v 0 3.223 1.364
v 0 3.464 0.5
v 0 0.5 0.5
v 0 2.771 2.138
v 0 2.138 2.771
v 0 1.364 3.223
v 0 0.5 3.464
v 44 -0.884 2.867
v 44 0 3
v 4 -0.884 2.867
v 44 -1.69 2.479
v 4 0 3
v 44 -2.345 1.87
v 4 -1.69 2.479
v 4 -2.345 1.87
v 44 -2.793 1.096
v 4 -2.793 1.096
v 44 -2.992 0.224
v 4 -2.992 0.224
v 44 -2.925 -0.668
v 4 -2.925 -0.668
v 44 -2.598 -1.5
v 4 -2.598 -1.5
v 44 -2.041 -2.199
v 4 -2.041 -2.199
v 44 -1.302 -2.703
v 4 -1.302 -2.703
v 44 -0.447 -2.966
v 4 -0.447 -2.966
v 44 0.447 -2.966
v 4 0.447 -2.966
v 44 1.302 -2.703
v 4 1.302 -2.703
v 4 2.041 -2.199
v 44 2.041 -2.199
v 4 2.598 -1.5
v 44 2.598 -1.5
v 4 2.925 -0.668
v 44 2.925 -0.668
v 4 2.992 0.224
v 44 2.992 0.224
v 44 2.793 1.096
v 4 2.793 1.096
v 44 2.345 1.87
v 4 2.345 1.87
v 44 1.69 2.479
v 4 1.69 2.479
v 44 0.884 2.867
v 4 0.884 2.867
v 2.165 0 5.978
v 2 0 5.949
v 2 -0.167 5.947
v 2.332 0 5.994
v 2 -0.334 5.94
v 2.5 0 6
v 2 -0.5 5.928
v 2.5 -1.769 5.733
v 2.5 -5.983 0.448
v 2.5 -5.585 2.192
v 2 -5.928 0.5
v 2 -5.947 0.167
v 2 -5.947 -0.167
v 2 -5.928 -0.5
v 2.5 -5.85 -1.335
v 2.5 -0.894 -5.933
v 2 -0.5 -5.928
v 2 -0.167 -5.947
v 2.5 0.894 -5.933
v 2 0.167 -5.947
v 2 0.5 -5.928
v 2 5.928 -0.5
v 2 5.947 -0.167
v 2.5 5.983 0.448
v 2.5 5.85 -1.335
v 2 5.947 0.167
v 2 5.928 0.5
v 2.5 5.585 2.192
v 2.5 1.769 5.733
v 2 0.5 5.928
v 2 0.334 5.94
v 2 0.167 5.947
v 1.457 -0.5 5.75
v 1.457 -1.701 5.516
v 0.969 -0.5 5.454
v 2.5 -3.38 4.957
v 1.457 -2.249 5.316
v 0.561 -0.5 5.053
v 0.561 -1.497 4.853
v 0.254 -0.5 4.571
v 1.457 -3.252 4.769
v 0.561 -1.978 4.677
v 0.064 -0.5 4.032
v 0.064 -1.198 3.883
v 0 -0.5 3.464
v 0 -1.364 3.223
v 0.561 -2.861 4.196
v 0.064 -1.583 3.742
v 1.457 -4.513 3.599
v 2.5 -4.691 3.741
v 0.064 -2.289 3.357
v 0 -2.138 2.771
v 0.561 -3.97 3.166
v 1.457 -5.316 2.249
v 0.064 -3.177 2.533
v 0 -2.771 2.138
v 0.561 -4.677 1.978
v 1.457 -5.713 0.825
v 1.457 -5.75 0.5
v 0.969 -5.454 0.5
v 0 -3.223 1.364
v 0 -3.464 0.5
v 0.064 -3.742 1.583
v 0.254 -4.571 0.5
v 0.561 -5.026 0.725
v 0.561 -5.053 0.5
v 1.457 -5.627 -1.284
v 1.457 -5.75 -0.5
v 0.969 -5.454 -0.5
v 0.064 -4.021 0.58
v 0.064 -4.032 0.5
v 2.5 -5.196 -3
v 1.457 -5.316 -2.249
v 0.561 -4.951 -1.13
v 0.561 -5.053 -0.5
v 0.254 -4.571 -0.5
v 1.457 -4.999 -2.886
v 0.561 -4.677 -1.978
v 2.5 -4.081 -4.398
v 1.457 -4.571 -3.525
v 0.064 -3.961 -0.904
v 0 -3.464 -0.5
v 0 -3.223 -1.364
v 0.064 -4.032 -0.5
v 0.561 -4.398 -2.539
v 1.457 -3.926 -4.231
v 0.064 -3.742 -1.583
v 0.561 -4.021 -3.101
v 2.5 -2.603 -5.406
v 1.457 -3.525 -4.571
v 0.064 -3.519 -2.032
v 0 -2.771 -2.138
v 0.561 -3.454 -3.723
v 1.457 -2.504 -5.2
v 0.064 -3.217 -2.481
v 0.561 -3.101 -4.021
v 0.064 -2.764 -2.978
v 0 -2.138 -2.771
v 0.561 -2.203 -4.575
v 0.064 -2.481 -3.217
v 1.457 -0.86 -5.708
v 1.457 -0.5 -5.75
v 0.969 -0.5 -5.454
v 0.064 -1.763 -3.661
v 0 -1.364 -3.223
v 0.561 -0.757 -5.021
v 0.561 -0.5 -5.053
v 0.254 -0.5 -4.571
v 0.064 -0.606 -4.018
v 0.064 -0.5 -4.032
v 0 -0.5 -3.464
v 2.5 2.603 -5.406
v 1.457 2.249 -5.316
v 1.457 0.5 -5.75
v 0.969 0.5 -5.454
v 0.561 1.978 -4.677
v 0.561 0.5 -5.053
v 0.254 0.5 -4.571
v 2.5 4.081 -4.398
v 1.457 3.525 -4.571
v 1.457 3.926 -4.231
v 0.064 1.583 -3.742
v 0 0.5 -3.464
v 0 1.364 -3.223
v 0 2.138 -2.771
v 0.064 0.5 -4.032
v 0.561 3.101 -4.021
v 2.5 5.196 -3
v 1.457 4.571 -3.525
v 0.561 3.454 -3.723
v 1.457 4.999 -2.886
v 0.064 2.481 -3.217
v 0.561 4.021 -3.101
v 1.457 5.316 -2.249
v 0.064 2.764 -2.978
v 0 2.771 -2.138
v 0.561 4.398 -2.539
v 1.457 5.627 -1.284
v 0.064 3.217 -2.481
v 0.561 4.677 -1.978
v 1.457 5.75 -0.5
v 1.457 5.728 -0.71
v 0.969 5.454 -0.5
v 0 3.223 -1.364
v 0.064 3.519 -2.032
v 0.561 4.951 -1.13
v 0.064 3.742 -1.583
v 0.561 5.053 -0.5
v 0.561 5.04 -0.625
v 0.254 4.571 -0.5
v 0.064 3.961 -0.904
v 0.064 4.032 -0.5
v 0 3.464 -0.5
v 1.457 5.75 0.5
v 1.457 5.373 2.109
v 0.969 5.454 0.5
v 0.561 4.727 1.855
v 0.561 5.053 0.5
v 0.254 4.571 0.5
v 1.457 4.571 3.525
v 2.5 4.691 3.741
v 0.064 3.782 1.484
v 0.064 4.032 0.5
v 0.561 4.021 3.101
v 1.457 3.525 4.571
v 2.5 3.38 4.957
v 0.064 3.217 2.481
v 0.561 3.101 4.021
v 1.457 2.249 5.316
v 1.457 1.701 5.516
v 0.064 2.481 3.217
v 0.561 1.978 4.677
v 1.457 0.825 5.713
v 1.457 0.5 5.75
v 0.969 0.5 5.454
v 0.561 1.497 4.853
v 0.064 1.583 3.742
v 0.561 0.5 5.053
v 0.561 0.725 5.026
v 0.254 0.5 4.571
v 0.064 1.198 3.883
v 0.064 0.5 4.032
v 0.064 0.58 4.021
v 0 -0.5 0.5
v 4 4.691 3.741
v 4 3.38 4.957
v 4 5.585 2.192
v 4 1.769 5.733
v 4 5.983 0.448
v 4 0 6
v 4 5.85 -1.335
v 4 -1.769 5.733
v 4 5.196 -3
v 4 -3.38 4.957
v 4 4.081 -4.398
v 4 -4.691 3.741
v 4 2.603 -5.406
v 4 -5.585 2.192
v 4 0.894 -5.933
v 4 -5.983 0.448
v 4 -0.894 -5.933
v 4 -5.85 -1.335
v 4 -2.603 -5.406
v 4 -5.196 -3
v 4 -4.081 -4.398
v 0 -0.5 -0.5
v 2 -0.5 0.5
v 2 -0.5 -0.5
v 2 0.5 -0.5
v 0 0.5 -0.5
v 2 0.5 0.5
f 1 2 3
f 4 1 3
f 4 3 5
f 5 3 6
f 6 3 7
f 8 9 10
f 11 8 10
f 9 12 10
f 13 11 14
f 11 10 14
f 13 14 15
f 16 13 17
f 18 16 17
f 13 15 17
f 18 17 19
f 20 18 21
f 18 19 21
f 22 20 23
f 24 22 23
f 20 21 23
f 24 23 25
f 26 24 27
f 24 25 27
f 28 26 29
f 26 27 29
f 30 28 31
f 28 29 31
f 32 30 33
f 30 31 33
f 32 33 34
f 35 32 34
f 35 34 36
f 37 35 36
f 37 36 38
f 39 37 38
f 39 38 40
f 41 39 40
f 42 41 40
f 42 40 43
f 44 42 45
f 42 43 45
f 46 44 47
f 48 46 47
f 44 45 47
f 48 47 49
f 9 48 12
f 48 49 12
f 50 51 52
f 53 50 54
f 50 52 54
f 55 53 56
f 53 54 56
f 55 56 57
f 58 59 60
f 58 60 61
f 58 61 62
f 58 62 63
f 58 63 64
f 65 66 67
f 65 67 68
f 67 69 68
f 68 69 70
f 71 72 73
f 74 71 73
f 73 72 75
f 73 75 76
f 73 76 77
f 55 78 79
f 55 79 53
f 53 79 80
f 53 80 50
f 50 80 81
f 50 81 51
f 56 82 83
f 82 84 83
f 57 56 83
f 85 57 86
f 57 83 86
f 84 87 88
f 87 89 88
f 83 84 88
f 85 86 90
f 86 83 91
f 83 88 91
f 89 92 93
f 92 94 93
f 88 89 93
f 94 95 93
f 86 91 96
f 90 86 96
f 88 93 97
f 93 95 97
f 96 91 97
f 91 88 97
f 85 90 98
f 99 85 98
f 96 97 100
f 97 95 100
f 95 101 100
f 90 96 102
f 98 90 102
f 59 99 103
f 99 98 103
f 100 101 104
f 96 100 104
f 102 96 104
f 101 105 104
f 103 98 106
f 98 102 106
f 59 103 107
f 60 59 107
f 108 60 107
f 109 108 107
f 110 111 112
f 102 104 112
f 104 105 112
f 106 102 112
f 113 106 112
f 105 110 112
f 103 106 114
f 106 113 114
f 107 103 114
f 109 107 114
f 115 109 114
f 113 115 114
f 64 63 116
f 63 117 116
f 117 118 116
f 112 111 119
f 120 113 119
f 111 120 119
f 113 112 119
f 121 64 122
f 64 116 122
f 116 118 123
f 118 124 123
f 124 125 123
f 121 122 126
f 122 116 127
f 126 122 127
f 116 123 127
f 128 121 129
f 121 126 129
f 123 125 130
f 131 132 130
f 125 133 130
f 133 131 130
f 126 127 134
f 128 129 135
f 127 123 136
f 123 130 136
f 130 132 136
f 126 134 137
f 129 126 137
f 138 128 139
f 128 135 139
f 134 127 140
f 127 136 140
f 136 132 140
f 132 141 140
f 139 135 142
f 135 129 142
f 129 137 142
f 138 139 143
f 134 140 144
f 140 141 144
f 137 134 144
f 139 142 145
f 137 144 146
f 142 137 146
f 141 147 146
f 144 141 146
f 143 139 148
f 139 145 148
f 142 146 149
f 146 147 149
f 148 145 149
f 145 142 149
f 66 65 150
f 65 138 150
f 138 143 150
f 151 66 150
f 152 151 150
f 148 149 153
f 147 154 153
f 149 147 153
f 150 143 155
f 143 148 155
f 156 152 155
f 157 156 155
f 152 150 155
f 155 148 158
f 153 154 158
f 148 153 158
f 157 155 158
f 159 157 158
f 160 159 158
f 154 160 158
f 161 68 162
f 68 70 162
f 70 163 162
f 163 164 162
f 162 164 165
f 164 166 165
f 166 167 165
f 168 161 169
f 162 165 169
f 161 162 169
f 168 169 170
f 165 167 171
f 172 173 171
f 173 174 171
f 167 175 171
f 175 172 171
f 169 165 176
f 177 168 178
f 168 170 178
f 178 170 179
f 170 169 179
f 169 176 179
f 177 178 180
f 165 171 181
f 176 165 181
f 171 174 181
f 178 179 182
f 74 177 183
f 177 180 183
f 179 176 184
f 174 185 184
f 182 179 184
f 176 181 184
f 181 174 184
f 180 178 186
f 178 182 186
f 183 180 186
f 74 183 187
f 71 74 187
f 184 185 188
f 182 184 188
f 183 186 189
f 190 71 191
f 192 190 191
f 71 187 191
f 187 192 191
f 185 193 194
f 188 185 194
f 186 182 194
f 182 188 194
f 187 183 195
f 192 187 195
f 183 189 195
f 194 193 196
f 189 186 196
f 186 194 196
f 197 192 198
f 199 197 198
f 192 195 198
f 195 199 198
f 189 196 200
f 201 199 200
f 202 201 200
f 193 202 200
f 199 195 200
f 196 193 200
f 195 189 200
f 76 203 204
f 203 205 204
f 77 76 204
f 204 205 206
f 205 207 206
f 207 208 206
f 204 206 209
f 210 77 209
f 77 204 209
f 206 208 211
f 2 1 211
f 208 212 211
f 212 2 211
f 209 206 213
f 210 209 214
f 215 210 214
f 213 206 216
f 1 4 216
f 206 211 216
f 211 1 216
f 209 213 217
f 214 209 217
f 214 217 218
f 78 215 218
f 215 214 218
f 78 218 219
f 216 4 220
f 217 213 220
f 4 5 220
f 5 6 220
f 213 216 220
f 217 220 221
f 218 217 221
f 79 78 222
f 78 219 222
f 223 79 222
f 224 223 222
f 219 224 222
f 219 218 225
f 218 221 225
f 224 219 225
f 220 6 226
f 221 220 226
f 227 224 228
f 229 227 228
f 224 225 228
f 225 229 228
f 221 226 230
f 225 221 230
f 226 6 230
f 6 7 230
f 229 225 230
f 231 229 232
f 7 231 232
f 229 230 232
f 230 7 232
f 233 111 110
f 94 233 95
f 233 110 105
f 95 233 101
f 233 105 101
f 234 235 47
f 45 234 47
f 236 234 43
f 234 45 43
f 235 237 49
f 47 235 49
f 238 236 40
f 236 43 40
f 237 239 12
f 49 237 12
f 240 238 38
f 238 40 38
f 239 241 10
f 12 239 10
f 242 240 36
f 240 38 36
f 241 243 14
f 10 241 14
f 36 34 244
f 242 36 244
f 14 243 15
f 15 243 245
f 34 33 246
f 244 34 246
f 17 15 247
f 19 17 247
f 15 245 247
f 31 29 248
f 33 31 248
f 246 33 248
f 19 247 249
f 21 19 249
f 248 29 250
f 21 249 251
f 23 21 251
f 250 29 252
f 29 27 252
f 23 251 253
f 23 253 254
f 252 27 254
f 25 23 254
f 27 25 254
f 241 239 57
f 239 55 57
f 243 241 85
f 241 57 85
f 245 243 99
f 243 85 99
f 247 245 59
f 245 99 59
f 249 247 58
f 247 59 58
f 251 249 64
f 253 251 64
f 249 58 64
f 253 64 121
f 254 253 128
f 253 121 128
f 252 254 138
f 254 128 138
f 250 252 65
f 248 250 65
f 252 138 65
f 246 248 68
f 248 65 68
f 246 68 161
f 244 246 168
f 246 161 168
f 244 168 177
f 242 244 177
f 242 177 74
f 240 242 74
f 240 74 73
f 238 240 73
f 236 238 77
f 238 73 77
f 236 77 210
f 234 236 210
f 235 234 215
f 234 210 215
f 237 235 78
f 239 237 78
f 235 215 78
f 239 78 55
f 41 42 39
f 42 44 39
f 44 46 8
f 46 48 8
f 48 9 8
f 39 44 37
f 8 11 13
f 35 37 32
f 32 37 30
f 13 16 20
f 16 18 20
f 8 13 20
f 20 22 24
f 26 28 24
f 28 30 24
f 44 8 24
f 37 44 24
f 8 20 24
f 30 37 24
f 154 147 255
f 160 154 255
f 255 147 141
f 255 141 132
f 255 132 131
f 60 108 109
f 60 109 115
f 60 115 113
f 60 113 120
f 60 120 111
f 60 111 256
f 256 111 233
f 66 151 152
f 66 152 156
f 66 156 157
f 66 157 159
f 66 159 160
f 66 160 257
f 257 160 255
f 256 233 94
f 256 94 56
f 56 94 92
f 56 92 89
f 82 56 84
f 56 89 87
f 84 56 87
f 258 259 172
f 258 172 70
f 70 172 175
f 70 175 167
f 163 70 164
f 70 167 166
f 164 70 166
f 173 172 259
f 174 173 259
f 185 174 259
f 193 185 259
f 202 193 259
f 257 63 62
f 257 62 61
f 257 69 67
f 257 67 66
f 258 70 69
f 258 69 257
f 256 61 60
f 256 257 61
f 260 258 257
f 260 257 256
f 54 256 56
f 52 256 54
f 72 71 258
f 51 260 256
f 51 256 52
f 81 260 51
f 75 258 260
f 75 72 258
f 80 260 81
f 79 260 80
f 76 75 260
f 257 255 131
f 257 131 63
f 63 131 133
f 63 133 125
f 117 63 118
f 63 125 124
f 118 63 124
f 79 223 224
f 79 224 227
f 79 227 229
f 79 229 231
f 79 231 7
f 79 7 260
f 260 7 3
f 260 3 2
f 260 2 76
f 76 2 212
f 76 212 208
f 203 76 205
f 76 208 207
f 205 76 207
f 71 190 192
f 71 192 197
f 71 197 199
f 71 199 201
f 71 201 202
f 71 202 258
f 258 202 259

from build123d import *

# Parameters (mm, degrees)
CUT_EXTRUDE_1_DEPTH = 2


with BuildPart() as part:
    # Эскиз1 → Повернуть1 (revolve)
    with BuildSketch(Plane.XY, mode=Mode.PRIVATE) as revolve_1_sk:
        with BuildLine():
            Line((0, 0), (44, 0))
            Line((44, 0), (44, 3))
            Line((44, 3), (4, 3))
            Line((4, 3), (4, 6))
            Line((4, 6), (2.5, 6))
            ThreePointArc((2.5, 6), (0.732233047, 5.267766953), (0, 3.5))
            Line((0, 3.5), (0, 0))
        make_face()
    revolve(revolve_1_sk.sketch.rotate(Axis((-40.27641129, 0, 0), (1, 0, 0)), 90), axis=Axis((-40.27641129, 0, 0), (1, 0, 0)))

    # Эскиз2 → Вырез-Вытянуть1 (cut)
    with BuildSketch(Plane.ZY):
        Polygon((-0.5, -6.861954459), (0.5, -6.861954459), (0.5, -0.5), (7.705566097, -0.5), (7.705566097, 0.5), (0.5, 0.5), (0.5, 7.070683112), (-0.5, 7.070683112), (-0.5, 0.5), (-7.496837445, 0.5), (-7.496837445, -0.5), (-0.5, -0.5), align=None)
    extrude(amount=-CUT_EXTRUDE_1_DEPTH, mode=Mode.SUBTRACT)


solid = part.part
